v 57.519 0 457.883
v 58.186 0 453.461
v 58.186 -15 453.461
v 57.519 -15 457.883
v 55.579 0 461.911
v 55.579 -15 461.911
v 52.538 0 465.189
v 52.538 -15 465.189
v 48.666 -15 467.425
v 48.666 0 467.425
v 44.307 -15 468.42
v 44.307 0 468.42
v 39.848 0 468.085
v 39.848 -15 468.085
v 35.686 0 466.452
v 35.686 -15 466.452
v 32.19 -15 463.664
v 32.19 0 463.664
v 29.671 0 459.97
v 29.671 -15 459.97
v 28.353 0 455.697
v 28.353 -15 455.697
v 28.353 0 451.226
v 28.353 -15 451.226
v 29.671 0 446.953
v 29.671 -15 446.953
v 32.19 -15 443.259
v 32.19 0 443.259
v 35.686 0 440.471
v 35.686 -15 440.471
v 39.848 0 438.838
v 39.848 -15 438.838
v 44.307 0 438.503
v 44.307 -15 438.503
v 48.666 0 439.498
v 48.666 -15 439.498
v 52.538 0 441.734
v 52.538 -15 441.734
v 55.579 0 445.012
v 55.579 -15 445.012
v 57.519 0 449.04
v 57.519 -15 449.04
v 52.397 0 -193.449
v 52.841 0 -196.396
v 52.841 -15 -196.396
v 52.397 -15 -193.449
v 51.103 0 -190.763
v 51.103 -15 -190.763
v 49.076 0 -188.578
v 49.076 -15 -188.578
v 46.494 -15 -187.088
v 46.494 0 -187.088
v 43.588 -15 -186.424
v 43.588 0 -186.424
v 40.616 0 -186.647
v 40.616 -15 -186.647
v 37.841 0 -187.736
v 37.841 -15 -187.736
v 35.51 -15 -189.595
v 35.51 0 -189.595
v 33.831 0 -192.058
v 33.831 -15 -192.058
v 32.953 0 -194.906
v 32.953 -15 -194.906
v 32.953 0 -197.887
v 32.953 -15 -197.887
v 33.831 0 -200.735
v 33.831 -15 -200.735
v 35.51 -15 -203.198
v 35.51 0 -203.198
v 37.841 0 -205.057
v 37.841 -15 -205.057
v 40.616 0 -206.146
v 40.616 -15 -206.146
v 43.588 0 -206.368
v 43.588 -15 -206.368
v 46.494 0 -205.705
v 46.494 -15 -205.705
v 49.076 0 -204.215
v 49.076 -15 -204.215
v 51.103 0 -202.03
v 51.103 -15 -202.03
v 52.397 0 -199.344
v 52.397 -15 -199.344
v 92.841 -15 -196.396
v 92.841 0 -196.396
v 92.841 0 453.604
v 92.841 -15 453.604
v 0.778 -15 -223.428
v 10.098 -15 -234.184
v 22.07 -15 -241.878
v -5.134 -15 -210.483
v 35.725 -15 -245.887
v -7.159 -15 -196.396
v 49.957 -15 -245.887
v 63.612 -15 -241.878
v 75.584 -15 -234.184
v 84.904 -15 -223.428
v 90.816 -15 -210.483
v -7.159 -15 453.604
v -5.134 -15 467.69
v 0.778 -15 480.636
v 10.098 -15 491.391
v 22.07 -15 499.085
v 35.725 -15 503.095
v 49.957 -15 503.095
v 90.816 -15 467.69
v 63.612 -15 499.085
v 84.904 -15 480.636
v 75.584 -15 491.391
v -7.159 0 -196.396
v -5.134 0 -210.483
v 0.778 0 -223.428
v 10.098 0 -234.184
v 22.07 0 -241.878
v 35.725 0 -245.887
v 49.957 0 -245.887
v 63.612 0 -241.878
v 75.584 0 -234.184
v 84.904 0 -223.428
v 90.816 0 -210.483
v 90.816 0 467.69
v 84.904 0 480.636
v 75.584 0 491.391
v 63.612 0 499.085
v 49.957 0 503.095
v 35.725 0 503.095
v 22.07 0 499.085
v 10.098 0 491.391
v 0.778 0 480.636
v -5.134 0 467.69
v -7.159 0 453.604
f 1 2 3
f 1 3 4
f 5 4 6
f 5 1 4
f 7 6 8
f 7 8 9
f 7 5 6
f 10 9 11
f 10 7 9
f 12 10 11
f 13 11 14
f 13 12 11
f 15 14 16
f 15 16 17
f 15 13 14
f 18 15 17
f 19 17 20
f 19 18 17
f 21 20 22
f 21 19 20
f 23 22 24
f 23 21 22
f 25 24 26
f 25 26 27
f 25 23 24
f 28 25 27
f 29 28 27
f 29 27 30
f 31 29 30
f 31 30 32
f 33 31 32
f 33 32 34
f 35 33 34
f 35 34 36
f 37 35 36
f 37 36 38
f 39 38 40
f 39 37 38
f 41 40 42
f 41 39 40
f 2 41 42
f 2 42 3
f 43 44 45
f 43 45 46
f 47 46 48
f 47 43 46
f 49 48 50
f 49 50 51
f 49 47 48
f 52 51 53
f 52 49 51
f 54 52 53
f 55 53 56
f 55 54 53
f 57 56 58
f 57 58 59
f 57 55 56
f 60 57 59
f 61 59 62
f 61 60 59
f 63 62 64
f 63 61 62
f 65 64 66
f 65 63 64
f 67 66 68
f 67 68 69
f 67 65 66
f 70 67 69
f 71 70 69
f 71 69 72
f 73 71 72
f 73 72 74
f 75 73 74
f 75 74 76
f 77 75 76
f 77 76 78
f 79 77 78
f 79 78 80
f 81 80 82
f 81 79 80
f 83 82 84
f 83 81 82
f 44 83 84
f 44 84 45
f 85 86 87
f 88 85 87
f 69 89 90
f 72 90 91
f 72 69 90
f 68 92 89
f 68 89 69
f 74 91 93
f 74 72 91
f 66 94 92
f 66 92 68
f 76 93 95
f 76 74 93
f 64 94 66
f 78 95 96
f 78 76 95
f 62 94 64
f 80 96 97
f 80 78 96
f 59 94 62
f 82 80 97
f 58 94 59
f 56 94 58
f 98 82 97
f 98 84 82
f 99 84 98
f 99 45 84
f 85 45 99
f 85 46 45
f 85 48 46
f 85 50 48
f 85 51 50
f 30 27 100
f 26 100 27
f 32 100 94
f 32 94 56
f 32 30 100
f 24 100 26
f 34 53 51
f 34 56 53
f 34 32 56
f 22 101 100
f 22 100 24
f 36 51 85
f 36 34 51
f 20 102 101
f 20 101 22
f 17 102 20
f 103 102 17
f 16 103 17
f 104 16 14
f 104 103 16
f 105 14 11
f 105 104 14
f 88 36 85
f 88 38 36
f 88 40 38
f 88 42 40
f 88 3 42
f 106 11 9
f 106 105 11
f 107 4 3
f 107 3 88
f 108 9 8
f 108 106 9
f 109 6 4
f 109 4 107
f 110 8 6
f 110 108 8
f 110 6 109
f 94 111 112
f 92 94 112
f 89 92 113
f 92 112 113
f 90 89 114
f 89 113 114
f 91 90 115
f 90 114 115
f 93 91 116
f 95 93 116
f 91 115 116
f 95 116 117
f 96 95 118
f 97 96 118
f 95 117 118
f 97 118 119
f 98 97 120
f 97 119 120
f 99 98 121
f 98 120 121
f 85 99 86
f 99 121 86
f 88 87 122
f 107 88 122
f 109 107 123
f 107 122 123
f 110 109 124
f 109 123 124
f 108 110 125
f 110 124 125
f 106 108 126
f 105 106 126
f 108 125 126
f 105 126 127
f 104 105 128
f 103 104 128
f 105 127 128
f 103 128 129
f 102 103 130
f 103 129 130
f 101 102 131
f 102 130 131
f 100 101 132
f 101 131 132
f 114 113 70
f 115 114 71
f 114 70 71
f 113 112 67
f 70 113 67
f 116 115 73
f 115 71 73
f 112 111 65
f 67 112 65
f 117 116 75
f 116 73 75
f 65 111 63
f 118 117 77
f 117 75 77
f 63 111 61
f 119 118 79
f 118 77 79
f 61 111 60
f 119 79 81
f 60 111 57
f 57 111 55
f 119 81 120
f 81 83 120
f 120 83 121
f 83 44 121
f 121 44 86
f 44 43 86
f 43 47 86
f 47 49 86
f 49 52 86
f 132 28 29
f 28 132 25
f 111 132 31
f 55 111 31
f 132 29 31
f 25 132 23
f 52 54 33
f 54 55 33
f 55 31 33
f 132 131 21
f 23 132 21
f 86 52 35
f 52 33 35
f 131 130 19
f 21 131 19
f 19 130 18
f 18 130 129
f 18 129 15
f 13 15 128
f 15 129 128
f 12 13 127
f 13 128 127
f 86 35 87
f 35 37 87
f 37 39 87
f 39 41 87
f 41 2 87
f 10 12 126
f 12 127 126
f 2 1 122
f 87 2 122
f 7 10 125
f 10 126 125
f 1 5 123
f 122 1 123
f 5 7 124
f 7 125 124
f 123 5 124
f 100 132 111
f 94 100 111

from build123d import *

# Parameters (mm, degrees)
F0_R     = 10
F0_R_2   = 15
F1_DEPTH = 15


with BuildPart() as f1:
    # F0 (on Front) → F1 (new body)
    with BuildSketch(Plane.XZ):
        with BuildLine():
            ThreePointArc((92.840909, 453.603581), (42.840909, 503.603581), (-7.159091, 453.603581))
            Line((-7.159091, 453.603581), (-7.159091, -196.396419))
            ThreePointArc((-7.159091, -196.396419), (42.840909, -246.396419), (92.840909, -196.396419))
            Line((92.840909, -196.396419), (92.840909, 453.603581))
        make_face()
        with Locations((42.840909, -196.396419)):
            Circle(F0_R, mode=Mode.SUBTRACT)
        with Locations((43.185845, 453.461479)):
            Circle(F0_R_2, mode=Mode.SUBTRACT)
    extrude(amount=F1_DEPTH)


solid = f1.part
